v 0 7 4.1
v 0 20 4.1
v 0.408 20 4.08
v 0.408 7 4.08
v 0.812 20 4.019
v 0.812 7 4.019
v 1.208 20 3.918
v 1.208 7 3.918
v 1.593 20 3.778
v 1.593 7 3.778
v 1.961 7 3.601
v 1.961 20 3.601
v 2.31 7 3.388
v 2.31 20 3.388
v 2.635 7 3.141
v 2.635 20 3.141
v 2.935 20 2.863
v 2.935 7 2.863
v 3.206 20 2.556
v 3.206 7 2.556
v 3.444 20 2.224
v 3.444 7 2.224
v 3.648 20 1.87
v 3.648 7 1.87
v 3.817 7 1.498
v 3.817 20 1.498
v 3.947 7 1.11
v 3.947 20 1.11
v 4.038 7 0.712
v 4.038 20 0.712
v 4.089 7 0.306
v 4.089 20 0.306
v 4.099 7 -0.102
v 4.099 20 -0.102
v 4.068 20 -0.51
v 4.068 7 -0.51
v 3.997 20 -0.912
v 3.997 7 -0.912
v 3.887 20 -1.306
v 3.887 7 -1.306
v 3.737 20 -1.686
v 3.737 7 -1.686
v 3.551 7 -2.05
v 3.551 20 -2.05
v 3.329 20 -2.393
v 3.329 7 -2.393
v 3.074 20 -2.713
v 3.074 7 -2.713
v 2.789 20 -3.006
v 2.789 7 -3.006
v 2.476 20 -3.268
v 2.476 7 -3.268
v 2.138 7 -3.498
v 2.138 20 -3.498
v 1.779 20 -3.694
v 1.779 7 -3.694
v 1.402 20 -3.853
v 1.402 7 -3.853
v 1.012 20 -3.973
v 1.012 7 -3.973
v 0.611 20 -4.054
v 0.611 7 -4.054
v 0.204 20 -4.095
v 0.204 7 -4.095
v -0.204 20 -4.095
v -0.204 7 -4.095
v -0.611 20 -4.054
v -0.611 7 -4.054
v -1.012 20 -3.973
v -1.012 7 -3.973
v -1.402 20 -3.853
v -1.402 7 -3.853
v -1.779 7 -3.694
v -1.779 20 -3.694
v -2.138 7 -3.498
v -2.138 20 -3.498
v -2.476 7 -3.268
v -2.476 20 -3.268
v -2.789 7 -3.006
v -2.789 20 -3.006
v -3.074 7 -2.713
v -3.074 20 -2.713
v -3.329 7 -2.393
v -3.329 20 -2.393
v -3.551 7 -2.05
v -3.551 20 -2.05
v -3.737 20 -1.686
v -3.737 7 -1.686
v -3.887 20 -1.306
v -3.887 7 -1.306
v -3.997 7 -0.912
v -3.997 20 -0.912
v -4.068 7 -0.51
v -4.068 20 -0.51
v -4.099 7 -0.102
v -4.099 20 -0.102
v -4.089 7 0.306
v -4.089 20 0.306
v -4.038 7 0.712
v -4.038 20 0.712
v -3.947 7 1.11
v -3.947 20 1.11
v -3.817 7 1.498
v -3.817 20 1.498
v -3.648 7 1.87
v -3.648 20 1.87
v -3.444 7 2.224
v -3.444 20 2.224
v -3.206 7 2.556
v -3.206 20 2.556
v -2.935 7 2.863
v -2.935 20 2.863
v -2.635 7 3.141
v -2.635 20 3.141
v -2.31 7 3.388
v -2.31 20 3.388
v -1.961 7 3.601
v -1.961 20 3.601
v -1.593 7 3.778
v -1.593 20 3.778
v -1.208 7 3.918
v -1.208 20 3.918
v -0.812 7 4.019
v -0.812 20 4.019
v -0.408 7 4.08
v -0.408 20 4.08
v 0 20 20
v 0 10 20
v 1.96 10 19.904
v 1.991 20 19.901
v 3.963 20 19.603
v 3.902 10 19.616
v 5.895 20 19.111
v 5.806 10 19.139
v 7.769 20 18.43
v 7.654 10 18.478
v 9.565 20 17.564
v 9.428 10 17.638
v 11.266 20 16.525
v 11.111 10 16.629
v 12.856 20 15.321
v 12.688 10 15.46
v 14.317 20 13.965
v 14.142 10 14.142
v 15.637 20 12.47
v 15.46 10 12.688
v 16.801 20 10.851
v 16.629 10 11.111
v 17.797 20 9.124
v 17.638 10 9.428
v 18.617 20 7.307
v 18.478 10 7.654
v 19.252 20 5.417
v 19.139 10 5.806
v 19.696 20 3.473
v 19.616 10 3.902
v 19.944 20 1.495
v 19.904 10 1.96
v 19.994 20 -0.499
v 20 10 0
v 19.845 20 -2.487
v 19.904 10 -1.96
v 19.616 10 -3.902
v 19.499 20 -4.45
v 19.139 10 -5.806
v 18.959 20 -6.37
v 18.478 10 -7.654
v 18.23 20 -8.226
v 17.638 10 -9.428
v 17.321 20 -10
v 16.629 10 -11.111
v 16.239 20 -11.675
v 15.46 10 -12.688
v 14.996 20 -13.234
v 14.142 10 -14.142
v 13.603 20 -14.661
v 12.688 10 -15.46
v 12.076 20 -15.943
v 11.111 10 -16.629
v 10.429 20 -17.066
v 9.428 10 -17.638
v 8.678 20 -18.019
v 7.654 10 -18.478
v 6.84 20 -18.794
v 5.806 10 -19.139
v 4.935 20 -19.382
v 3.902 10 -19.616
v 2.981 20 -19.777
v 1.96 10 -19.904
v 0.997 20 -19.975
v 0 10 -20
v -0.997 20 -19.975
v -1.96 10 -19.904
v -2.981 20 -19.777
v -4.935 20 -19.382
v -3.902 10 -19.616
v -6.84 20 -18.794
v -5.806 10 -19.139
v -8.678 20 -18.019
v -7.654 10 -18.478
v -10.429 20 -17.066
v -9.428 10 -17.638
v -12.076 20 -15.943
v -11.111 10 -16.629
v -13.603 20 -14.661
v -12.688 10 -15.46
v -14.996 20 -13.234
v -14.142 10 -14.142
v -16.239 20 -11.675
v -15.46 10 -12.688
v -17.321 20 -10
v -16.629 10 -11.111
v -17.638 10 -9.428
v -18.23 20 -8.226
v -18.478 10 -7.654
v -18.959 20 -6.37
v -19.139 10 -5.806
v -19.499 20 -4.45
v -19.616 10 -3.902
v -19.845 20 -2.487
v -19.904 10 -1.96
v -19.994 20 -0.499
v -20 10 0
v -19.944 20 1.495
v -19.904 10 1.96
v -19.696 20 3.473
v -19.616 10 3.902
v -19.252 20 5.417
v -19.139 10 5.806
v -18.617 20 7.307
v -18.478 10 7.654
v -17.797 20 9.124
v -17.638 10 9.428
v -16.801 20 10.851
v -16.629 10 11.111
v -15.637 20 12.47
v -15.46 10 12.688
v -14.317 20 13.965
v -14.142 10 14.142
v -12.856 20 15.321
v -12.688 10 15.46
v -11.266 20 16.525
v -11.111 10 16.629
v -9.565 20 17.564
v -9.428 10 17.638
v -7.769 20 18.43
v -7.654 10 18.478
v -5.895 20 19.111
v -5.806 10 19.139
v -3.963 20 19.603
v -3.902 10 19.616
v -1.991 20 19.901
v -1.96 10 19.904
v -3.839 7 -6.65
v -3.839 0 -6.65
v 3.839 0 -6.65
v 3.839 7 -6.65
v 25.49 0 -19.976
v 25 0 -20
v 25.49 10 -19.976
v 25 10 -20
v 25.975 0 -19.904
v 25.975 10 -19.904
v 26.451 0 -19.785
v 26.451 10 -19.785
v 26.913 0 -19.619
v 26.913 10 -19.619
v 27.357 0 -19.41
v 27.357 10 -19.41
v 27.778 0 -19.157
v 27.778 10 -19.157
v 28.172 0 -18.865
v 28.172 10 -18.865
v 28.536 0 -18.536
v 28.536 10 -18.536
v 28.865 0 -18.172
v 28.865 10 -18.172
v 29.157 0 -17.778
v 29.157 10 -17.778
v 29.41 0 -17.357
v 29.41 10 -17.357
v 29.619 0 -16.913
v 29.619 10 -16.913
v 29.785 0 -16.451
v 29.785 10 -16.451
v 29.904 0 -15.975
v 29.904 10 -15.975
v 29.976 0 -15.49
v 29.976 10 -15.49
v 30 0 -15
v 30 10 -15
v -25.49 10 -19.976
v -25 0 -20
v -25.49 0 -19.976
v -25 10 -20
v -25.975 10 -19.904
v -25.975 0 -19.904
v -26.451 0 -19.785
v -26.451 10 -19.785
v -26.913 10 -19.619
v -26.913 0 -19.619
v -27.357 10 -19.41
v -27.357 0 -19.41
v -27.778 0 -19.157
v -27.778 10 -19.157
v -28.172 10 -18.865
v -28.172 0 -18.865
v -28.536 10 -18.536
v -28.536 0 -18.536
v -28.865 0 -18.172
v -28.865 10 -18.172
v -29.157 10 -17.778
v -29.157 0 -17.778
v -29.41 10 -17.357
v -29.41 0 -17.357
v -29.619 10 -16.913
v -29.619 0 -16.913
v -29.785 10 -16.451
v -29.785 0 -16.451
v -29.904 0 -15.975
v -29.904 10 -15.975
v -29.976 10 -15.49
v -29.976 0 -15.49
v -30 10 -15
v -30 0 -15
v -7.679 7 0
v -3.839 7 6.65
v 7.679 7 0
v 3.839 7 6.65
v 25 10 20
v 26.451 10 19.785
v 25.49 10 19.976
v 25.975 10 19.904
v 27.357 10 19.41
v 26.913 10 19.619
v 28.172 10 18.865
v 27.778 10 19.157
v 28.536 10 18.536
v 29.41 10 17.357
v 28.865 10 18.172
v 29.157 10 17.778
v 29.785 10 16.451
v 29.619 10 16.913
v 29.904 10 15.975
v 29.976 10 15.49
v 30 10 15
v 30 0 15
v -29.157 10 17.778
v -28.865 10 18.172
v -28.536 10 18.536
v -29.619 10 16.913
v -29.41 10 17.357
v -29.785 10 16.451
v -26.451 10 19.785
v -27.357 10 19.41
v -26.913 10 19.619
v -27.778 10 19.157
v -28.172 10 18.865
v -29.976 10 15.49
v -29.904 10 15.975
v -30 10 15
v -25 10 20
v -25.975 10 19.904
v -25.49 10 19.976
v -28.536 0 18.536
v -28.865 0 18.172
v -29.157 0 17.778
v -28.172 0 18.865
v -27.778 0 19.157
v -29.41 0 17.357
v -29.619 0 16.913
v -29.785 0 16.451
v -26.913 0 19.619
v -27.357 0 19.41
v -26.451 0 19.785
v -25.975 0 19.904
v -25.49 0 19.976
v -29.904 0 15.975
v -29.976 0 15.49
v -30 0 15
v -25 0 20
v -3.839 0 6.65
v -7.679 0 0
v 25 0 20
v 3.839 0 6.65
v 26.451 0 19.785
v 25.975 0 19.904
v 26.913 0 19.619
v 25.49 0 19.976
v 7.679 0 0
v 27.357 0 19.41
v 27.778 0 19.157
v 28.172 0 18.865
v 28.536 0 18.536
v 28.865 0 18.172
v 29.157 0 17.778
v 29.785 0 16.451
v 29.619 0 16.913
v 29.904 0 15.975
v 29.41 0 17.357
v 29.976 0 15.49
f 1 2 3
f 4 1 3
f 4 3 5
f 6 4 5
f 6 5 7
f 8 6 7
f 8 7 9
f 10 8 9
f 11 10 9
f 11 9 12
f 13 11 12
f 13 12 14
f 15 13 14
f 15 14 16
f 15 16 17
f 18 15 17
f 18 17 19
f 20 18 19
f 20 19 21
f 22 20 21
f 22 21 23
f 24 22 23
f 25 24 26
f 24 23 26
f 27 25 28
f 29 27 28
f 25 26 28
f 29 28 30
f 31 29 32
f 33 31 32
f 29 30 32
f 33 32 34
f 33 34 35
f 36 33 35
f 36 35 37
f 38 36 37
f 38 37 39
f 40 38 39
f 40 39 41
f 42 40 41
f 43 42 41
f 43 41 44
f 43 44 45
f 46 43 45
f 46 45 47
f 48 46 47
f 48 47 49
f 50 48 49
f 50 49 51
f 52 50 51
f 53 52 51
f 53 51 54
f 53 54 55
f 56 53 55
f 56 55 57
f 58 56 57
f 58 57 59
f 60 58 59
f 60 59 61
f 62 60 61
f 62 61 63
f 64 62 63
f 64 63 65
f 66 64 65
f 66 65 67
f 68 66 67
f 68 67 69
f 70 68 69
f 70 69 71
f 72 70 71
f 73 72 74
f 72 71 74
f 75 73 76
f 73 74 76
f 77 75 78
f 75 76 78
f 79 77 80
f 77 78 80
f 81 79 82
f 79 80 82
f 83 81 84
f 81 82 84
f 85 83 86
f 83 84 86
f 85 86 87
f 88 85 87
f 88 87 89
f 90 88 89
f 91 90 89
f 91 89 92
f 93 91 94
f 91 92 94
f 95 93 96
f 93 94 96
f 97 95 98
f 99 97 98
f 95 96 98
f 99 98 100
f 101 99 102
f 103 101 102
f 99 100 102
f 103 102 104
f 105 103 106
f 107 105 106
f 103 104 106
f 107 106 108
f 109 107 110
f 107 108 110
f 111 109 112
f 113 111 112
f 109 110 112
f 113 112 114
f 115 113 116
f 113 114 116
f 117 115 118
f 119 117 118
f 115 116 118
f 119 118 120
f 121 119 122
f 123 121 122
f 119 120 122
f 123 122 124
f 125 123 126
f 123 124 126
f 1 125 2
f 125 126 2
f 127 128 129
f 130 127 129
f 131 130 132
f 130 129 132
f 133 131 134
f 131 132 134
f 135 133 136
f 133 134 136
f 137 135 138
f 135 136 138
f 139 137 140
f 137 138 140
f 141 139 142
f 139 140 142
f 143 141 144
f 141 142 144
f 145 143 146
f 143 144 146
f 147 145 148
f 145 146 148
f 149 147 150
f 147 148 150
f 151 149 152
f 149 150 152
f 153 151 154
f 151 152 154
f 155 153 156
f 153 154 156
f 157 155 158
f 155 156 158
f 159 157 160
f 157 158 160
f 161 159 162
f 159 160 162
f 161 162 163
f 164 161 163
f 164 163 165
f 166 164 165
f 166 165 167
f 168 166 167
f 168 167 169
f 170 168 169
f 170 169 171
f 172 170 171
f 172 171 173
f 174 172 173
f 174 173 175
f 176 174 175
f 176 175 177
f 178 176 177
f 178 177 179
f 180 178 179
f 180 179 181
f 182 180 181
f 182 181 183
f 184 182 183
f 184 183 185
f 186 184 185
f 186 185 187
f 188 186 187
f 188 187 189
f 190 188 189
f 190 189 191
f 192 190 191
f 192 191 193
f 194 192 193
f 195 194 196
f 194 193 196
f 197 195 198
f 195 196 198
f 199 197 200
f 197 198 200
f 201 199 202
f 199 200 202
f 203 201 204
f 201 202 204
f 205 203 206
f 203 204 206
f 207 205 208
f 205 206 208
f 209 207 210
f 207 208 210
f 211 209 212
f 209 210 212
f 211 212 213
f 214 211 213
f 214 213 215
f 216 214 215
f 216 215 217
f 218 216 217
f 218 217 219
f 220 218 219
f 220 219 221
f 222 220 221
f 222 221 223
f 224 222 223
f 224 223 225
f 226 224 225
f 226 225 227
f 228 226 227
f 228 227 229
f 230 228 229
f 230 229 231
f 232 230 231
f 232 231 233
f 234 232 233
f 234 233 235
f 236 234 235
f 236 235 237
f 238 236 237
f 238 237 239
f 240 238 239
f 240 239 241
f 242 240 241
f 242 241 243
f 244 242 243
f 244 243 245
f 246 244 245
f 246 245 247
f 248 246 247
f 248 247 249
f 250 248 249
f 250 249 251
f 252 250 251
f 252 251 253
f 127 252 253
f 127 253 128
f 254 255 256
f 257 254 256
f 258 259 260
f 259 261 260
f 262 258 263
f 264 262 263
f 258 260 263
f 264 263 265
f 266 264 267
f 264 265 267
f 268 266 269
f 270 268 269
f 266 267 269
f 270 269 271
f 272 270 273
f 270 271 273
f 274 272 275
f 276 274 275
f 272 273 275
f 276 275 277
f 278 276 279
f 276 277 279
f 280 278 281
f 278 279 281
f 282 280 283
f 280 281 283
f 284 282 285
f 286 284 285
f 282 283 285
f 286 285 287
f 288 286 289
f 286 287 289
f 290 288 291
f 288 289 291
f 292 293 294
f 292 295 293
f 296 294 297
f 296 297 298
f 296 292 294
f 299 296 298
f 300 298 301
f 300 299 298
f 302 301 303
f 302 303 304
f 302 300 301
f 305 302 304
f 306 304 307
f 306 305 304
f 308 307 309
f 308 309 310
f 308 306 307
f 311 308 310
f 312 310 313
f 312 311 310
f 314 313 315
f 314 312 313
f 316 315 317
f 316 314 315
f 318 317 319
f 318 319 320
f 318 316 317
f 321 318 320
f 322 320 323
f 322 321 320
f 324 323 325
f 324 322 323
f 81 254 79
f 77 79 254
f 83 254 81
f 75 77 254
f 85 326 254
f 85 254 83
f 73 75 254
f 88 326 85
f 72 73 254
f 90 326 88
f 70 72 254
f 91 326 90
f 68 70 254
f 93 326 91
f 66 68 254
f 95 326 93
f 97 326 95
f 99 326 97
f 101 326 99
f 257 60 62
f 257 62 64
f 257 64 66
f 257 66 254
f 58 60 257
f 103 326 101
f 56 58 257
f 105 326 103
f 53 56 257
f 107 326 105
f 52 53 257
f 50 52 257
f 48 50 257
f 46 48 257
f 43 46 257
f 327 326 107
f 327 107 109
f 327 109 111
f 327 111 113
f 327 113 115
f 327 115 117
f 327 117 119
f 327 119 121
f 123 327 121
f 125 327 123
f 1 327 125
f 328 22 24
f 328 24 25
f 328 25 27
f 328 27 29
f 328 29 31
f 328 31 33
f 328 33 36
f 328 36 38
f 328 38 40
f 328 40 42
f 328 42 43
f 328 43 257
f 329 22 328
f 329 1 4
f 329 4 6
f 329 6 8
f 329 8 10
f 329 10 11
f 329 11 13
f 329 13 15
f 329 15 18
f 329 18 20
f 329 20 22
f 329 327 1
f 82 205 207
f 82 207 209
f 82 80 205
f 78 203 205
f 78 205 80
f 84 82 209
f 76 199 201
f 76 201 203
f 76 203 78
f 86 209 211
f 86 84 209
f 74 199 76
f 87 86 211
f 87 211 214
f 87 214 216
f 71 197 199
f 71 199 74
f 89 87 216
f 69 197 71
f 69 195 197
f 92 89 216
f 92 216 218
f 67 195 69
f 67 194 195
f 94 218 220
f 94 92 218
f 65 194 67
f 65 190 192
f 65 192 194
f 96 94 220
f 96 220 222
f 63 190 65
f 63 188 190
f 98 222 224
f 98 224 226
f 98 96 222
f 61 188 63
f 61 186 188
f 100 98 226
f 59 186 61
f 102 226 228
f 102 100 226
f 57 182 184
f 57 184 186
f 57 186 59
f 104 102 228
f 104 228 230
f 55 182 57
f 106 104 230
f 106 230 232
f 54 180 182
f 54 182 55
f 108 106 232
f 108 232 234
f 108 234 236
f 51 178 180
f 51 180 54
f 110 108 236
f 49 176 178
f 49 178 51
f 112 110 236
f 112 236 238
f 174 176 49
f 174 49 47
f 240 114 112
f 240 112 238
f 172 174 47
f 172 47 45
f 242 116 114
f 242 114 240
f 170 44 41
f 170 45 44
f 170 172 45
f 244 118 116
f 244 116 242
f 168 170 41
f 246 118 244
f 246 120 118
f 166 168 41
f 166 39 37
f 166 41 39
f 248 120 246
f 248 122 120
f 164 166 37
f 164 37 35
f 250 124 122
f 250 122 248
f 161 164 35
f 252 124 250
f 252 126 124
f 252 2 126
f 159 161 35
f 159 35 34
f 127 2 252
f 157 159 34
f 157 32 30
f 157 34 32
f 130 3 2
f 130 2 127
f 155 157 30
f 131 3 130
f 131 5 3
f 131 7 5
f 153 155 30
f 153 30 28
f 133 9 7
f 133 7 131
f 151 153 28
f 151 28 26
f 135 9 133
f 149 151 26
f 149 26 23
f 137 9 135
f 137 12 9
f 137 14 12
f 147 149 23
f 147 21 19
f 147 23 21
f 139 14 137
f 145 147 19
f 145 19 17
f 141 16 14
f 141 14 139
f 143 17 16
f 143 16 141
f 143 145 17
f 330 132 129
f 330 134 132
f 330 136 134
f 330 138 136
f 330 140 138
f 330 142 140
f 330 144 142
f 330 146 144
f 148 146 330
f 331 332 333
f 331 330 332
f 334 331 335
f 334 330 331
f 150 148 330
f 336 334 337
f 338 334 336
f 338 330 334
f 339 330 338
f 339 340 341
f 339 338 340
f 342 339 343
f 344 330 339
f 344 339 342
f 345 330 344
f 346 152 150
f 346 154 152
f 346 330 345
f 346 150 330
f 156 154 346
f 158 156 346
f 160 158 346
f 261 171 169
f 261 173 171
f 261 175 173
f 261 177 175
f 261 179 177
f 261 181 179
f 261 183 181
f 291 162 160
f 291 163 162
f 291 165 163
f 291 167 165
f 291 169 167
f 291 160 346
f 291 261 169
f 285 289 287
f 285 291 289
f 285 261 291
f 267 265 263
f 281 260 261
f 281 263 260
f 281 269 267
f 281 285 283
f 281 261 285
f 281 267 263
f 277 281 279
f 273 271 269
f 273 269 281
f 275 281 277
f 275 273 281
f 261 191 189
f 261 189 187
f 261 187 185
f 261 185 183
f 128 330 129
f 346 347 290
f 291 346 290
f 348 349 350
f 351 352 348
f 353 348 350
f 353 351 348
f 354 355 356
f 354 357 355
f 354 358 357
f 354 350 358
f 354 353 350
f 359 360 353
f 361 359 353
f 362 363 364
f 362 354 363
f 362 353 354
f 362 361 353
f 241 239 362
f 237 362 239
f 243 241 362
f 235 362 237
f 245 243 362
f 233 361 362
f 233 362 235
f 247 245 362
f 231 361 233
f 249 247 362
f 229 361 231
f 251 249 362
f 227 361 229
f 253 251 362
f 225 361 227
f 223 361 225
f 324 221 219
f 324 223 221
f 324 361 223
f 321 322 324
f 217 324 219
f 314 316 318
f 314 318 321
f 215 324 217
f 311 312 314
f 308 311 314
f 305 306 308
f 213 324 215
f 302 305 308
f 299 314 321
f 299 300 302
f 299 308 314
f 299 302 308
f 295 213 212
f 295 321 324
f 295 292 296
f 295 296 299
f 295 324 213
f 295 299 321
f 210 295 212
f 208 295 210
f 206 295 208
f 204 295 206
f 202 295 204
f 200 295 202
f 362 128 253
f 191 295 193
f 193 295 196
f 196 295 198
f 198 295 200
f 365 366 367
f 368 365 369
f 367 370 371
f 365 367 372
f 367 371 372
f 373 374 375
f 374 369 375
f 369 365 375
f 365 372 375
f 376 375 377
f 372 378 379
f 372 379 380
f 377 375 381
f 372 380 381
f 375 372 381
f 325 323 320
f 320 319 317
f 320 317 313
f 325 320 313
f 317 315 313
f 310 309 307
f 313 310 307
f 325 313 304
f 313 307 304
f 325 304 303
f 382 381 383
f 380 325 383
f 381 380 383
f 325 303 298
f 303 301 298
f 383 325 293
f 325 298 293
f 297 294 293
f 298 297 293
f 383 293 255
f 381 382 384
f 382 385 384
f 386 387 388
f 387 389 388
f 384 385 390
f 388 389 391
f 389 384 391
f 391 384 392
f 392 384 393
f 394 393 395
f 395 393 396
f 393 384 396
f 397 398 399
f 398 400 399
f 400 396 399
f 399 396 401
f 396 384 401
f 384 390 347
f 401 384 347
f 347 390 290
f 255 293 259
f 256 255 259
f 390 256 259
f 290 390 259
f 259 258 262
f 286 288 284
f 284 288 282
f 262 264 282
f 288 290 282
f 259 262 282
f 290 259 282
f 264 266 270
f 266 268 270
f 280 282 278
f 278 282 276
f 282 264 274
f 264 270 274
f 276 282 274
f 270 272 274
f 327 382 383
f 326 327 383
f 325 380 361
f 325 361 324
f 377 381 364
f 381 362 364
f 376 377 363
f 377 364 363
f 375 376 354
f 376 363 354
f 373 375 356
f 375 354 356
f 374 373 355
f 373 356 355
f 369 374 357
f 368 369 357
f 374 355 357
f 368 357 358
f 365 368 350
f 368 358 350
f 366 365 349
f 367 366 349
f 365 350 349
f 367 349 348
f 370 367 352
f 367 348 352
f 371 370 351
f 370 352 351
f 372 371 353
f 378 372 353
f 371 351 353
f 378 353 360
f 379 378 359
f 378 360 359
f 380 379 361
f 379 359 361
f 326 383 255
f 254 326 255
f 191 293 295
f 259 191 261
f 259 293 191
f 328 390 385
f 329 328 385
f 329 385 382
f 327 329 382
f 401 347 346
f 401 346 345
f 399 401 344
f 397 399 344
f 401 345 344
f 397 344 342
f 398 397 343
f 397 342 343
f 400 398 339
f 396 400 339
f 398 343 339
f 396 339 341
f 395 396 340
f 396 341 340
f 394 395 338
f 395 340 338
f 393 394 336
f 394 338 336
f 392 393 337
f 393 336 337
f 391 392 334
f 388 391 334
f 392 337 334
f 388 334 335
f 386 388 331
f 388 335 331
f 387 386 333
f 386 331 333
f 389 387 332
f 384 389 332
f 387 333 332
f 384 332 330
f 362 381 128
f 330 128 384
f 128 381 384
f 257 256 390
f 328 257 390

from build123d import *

# Parameters (mm, degrees)
SKETCH1_W           = 60
SKETCH1_H           = 40
BOSS_EXTRUDE1_DEPTH = 10
SKETCH2_R           = 20
BOSS_EXTRUDE2_DEPTH = 10
SKETCH4_R           = 4.1
CUT_EXTRUDE1_DEPTH  = 42.231056256
FILLET1_R           = 5
CUT_EXTRUDE2_DEPTH  = 7


with BuildPart() as part:
    # Sketch1 → Boss-Extrude1 (new body)
    with BuildSketch(Plane(origin=(0, 0, 0), x_dir=(1, 0, 0), z_dir=(0, 1, 0))):
        Rectangle(SKETCH1_W, SKETCH1_H)
    extrude(amount=BOSS_EXTRUDE1_DEPTH)

    # Sketch2 → Boss-Extrude2 (add)
    with BuildSketch(Plane(origin=(0, 10, 0), x_dir=(1, 0, 0), z_dir=(0, 1, 0))):
        with Locations(Location((0, 0, 0), (0, 0, 270))):
            Circle(SKETCH2_R)
    extrude(amount=BOSS_EXTRUDE2_DEPTH)

    # Sketch4 → Cut-Extrude1 (cut, through all)
    with BuildSketch(Plane(origin=(0, 20, 0), x_dir=(1, 0, 0), z_dir=(0, 1, 0))):
        with Locations(Location((0, 0, 0), (0, 0, 270))):
            Circle(SKETCH4_R)
    extrude(amount=-CUT_EXTRUDE1_DEPTH, mode=Mode.SUBTRACT)

    # Fillet1
    fillet1_edges = [part.edges().sort_by_distance(p)[0] for p in [
        (-30, 5, -20),
        (30, 5, -20),
        (30, 5, 20),
        (-30, 5, 20),
    ]]
    fillet(fillet1_edges, radius=FILLET1_R)

    # Sketch5 → Cut-Extrude2 (cut)
    with BuildSketch(Plane.XZ):
        Polygon((-7.67875858, 0), (-3.83937929, -6.65), (3.83937929, -6.65), (7.67875858, 0), (3.83937929, 6.65), (-3.83937929, 6.65), align=None)
    extrude(amount=-CUT_EXTRUDE2_DEPTH, mode=Mode.SUBTRACT)


solid = part.part
